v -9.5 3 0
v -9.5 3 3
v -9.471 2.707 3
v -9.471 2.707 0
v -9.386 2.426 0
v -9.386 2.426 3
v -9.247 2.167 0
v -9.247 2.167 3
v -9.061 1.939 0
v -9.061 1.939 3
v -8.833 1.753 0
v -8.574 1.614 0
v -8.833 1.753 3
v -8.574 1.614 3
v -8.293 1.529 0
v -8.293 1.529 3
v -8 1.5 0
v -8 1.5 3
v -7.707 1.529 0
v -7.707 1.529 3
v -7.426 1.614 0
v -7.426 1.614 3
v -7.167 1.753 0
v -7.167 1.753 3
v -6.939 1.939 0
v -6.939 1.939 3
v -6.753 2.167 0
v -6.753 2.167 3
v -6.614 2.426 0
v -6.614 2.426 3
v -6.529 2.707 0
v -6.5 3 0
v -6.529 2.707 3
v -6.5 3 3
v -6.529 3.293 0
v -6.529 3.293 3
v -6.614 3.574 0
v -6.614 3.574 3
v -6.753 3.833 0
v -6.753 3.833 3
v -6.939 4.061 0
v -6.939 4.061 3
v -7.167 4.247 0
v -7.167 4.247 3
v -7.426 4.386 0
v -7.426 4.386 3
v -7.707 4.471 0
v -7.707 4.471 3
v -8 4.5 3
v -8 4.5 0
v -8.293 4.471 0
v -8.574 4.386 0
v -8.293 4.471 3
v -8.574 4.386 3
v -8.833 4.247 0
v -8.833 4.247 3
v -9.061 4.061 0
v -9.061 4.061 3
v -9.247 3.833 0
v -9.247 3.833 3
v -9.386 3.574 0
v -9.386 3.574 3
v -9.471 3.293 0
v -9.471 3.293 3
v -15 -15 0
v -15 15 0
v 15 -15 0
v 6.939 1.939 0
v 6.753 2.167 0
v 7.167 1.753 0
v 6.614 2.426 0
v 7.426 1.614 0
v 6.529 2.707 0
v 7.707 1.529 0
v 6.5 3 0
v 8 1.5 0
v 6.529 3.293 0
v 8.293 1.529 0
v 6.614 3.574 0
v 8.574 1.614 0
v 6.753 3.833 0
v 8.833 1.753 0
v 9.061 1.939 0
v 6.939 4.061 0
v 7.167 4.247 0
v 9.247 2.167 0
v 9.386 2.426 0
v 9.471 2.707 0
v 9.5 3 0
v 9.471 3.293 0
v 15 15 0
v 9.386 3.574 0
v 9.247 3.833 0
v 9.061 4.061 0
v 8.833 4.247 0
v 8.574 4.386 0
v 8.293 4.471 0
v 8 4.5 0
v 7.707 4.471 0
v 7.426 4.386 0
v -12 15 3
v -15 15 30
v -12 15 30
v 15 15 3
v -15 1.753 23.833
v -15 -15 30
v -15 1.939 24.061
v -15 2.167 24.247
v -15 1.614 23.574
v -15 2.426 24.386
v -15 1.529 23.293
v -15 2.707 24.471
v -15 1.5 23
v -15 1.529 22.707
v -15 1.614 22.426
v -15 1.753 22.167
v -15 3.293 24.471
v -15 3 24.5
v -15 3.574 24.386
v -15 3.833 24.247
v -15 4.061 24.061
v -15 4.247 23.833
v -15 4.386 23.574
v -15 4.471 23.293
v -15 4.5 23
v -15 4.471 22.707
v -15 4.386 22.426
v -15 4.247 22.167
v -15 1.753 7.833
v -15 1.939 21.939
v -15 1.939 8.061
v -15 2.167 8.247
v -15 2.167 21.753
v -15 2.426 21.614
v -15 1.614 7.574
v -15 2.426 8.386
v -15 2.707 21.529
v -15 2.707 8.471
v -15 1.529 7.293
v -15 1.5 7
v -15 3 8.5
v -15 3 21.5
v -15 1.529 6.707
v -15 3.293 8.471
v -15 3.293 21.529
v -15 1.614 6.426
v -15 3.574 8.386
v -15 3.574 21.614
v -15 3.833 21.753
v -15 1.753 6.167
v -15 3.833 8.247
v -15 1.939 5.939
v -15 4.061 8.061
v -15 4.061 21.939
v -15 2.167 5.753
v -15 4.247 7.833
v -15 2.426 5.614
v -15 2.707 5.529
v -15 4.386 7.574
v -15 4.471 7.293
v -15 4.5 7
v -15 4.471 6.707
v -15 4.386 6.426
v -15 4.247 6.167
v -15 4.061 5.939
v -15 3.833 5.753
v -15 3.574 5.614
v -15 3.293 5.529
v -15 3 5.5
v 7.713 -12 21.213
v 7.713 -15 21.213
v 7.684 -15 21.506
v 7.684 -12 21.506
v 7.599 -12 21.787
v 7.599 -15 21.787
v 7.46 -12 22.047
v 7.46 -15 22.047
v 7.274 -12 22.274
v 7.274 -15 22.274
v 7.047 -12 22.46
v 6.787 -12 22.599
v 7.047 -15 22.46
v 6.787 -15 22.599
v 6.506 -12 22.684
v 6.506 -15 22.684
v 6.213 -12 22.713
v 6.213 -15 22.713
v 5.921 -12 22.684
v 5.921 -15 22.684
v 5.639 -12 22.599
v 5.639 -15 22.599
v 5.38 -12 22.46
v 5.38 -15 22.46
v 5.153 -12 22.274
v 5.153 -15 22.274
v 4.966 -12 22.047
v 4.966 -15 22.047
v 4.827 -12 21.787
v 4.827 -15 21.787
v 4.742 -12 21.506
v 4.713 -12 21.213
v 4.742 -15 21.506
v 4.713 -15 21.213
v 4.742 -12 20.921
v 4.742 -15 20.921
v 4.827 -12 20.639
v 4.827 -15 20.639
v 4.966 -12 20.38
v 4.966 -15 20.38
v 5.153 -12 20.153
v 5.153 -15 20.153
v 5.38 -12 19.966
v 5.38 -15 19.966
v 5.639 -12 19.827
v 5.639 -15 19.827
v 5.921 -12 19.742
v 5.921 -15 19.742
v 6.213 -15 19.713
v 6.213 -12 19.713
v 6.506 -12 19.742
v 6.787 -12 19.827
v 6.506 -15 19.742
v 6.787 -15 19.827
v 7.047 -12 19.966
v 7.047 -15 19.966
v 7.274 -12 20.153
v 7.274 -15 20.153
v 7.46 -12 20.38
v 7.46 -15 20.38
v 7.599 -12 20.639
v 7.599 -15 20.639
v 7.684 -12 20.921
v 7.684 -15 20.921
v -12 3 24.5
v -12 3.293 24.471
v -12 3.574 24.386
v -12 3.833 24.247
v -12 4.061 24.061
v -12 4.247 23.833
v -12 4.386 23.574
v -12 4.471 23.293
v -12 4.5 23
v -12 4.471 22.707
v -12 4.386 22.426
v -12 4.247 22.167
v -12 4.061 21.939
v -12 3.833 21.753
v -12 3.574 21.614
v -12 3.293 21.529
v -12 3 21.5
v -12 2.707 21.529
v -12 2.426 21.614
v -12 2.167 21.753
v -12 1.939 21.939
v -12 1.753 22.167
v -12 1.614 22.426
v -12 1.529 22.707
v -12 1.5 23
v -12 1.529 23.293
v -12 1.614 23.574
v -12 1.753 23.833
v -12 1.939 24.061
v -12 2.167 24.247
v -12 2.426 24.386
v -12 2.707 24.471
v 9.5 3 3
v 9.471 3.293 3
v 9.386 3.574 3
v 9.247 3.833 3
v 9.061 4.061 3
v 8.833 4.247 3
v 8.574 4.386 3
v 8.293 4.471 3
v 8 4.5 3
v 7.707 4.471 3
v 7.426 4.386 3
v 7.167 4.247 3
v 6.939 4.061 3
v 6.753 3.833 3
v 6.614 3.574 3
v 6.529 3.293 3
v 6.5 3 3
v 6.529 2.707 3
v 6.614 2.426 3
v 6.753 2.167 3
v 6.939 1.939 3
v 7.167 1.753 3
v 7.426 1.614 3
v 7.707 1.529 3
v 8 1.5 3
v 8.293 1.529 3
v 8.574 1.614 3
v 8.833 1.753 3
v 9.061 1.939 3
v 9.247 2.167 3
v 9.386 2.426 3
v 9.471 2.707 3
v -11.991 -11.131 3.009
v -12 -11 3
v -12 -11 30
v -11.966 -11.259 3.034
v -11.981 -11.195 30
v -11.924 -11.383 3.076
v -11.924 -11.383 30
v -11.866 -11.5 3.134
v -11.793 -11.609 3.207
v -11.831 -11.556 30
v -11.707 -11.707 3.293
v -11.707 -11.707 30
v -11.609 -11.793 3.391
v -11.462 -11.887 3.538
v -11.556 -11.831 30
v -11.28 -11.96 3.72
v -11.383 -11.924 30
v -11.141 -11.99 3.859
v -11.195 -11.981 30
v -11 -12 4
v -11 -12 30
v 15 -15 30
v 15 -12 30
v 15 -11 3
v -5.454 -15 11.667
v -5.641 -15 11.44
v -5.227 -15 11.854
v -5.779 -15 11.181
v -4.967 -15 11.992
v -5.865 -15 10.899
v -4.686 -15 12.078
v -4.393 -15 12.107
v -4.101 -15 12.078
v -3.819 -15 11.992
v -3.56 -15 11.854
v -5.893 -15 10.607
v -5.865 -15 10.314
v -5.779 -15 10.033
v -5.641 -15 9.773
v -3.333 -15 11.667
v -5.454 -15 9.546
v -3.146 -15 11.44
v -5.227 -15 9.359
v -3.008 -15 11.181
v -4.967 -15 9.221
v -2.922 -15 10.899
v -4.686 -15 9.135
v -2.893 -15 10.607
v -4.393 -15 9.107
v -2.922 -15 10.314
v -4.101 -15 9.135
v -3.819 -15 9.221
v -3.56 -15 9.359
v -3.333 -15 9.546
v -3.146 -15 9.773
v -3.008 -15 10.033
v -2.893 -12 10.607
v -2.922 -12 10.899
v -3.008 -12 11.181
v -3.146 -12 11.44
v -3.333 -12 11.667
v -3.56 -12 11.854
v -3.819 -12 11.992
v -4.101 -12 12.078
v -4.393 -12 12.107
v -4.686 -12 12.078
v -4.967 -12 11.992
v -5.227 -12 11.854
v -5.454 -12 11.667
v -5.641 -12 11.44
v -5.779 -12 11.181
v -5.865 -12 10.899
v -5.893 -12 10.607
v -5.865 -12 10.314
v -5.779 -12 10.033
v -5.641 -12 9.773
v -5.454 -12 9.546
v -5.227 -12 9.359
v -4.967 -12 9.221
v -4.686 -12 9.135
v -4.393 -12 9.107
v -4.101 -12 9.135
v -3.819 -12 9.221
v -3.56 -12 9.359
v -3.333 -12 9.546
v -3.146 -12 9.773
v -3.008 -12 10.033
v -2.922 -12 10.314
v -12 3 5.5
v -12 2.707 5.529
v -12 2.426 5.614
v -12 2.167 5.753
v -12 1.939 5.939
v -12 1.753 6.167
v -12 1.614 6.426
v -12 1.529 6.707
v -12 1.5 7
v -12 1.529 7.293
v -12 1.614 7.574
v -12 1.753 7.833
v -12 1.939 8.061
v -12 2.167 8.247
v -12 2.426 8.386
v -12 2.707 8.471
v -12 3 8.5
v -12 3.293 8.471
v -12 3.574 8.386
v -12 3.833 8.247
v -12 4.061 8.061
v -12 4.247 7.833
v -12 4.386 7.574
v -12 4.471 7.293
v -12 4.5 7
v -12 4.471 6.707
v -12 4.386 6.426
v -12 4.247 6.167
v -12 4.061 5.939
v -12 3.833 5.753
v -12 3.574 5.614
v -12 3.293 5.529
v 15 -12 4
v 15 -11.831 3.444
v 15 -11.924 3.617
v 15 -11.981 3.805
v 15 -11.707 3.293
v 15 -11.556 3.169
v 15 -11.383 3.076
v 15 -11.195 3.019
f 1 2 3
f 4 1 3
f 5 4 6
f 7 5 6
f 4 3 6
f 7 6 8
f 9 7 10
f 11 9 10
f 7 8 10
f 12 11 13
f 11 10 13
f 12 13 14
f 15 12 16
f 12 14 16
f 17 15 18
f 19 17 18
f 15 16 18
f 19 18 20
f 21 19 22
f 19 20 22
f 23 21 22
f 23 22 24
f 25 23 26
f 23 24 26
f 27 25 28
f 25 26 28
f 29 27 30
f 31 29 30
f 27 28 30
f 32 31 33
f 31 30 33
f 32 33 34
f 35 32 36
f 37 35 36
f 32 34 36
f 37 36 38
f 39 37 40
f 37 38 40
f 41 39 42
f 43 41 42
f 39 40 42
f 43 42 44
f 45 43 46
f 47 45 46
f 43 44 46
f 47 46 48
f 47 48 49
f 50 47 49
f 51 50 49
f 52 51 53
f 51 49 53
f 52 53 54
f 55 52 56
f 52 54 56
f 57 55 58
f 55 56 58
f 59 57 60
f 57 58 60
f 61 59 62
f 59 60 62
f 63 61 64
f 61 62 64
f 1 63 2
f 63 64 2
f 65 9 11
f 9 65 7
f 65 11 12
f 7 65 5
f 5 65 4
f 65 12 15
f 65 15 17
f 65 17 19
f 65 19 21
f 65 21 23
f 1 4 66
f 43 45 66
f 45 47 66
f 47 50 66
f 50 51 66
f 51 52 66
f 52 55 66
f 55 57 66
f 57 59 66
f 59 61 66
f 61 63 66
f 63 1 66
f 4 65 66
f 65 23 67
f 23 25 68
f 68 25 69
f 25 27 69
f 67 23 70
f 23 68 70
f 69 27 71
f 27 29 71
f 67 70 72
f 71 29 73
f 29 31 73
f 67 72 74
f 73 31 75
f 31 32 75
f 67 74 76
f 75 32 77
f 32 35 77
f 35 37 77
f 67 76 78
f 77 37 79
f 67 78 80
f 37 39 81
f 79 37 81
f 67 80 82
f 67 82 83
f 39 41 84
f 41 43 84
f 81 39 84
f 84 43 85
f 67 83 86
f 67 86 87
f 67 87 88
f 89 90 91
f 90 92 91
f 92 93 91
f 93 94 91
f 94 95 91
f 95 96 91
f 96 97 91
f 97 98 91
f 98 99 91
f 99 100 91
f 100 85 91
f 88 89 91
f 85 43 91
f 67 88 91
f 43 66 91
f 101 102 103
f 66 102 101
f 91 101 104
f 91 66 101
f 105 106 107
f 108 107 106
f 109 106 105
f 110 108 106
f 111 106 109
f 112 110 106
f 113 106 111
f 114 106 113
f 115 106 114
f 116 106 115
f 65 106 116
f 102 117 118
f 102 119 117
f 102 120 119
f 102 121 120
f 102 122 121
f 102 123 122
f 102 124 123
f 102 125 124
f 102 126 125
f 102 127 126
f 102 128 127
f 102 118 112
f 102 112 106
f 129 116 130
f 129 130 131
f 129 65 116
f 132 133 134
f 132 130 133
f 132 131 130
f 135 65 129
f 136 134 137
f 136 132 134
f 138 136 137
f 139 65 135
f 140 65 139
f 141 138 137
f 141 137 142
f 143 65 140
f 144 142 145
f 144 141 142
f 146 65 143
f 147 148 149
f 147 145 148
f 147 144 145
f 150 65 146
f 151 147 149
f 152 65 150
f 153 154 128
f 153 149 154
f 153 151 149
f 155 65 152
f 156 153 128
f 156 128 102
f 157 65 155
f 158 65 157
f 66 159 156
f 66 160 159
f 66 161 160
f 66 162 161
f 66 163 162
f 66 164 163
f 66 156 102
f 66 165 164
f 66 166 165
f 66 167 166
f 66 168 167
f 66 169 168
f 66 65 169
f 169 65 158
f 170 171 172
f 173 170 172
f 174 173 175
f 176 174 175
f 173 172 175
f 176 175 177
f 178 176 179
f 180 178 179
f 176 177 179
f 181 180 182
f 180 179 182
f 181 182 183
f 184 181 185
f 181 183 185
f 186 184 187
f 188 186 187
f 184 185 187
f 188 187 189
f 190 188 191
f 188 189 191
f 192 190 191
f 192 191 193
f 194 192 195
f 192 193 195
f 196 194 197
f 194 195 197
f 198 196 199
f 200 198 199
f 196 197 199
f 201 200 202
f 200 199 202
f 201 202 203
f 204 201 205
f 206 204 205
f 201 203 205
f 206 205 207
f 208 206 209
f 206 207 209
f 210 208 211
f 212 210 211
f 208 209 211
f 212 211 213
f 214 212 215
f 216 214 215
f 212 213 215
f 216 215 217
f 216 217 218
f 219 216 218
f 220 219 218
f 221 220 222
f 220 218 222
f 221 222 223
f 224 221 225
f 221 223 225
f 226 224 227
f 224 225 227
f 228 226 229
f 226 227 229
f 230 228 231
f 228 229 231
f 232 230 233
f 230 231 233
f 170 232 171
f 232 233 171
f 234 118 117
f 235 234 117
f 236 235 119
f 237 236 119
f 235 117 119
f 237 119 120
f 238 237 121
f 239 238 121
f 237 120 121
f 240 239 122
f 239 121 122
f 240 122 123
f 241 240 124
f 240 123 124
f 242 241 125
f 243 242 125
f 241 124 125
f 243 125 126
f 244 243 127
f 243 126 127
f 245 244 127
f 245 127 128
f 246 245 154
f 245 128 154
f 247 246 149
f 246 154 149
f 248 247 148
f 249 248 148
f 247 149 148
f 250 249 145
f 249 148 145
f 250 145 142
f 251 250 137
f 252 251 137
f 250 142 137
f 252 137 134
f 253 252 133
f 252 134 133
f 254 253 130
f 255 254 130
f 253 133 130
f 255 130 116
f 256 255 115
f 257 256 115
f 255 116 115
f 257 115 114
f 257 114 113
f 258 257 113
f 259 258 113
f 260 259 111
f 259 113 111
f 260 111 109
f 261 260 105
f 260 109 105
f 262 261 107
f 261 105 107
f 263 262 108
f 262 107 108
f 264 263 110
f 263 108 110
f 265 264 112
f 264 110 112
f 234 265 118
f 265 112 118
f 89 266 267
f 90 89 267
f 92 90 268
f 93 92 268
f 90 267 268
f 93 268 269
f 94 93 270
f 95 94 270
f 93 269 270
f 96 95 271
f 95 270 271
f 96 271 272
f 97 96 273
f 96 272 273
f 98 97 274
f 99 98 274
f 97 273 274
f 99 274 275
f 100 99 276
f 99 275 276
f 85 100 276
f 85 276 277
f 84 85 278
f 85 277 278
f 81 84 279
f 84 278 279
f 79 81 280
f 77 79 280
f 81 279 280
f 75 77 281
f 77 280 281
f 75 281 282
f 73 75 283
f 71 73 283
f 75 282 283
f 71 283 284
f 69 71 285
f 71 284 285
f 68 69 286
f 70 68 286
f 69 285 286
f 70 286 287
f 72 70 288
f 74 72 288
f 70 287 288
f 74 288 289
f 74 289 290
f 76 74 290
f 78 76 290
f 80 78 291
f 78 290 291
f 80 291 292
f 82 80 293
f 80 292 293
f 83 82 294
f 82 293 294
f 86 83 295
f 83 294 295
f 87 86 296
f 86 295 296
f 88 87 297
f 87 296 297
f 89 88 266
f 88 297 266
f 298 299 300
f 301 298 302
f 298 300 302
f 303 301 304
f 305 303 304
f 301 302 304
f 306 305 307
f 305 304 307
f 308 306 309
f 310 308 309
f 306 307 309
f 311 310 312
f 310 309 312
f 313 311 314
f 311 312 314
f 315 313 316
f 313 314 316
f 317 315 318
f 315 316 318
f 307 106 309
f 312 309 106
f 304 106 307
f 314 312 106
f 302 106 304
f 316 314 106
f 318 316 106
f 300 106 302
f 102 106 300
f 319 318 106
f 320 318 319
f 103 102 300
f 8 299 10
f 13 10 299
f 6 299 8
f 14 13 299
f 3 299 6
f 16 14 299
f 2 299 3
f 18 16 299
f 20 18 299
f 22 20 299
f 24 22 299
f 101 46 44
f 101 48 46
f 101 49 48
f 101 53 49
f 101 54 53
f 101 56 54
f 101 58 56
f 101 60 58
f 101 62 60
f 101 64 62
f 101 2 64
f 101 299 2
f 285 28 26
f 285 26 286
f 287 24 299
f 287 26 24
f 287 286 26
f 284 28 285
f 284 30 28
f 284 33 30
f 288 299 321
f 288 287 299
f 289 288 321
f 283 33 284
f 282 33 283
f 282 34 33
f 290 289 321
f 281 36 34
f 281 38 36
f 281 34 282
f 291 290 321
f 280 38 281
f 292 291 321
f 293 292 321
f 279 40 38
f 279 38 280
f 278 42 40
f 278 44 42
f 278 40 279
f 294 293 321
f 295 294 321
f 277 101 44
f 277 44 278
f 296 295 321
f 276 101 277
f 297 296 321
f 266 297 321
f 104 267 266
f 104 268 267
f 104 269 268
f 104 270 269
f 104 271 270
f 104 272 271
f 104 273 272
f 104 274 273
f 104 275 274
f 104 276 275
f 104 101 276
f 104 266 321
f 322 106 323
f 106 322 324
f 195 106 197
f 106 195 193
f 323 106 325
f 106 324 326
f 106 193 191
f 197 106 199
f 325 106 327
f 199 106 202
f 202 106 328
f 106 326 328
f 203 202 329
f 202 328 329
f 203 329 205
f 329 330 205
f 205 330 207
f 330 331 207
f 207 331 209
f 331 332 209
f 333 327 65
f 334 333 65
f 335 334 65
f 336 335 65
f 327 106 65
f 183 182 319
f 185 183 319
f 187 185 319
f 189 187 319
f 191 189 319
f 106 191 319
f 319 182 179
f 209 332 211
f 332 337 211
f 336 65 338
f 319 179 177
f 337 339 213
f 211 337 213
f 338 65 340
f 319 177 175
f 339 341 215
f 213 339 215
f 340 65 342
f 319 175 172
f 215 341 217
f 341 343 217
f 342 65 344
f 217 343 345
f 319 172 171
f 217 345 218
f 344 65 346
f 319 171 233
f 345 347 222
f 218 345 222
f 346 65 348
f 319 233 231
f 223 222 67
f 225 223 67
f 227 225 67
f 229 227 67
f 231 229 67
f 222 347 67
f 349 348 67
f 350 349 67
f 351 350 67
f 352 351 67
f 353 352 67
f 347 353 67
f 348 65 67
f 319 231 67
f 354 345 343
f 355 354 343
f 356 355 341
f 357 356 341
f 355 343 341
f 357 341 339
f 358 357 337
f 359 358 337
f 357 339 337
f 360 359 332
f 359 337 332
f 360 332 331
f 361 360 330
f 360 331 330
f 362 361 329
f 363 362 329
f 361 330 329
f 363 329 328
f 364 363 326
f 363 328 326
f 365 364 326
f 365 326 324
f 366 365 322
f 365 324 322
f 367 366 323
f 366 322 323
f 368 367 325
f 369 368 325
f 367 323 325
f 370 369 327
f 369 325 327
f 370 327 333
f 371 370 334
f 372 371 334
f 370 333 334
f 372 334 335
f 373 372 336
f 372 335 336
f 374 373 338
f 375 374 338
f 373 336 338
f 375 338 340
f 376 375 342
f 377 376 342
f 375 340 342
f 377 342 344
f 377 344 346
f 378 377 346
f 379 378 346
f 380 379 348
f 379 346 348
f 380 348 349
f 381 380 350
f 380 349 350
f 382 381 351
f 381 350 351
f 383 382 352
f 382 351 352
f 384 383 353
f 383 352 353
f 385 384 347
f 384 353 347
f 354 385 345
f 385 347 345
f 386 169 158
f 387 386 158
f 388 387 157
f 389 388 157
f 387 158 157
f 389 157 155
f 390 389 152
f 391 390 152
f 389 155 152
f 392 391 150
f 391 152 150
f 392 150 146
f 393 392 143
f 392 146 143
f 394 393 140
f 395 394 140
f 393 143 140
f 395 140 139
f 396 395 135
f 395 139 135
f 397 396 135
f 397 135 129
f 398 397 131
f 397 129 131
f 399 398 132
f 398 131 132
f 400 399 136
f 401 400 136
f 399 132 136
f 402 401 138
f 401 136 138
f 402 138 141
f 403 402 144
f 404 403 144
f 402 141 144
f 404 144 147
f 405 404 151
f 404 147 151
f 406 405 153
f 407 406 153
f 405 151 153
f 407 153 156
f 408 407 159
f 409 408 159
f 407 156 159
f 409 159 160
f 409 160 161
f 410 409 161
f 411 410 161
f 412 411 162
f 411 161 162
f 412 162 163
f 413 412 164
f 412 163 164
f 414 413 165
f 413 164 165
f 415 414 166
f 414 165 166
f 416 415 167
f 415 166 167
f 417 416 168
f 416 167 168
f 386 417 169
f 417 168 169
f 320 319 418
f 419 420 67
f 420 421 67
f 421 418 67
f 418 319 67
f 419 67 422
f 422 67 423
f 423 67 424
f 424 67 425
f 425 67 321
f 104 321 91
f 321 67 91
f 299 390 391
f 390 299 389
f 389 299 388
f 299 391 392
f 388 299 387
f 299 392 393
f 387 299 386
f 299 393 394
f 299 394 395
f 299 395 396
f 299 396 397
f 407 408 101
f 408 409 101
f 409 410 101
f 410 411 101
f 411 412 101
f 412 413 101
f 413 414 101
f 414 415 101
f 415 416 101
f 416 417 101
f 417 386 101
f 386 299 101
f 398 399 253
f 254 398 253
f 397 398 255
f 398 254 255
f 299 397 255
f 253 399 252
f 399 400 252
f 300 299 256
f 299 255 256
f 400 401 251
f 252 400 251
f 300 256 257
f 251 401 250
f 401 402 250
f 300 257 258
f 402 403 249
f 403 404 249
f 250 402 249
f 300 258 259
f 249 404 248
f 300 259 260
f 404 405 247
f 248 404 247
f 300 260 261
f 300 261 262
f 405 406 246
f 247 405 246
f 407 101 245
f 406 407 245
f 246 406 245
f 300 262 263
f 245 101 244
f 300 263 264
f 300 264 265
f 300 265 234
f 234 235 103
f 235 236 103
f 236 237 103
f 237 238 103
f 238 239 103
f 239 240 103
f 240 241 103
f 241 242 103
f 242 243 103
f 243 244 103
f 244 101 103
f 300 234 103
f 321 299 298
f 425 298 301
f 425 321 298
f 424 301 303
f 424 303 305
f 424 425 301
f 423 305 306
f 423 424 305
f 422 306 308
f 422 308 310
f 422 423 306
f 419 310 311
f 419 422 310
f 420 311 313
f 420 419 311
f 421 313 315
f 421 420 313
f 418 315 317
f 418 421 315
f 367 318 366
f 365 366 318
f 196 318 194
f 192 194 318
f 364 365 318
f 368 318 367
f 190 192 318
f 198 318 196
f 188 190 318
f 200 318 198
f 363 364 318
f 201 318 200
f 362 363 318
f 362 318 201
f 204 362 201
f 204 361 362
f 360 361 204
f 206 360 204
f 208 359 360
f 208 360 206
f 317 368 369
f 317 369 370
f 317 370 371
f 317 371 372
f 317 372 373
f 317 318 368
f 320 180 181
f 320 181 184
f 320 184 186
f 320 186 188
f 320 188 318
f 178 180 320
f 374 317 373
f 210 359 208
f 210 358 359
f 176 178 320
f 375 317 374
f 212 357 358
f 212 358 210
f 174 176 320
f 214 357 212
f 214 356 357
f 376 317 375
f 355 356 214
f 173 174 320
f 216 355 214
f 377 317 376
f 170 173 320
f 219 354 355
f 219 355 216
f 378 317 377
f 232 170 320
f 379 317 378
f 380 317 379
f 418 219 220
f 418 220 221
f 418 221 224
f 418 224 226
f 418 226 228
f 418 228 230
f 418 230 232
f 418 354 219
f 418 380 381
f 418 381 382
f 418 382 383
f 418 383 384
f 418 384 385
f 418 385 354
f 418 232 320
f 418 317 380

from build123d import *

# Parameters (mm, degrees)
SKETCH_1_W          = 30
SKETCH_1_H          = 30
EXTRUDE_1_DEPTH     = 3
SKETCH_2_R          = 1.5
CUT_EXTRUDE_1_DEPTH = 3
SKETCH_3_W          = 30
SKETCH_3_H          = 3
EXTRUDE_2_DEPTH     = 27
SKETCH_5_W          = 30
SKETCH_5_H          = 30
EXTRUDE_3_DEPTH     = 3
FILLET_1_R          = 1
SKETCH_10_R         = 1.5
CUT_EXTRUDE_4_DEPTH = 3
SKETCH_11_R         = 1.5
CUT_EXTRUDE_5_DEPTH = 3


with BuildPart() as part:
    # 草图1 → 凸台-拉伸1 (new body)
    with BuildSketch(Plane.XY):
        Rectangle(SKETCH_1_W, SKETCH_1_H)
    extrude(amount=EXTRUDE_1_DEPTH)

    # 草图2 → 切除-拉伸1 (cut)
    with BuildSketch(Plane.XY.offset(3)):
        with Locations((8, 3)):
            Circle(SKETCH_2_R)
        with Locations(Location((-8, 3, 0), (0, 0, 180))):
            Circle(SKETCH_2_R)
    extrude(amount=-CUT_EXTRUDE_1_DEPTH, mode=Mode.SUBTRACT)

    # 草图3 → 凸台-拉伸2 (add)
    with BuildSketch(Plane.XY.offset(3)):
        with Locations((0, -13.5)):
            Rectangle(SKETCH_3_W, SKETCH_3_H)
    extrude(amount=EXTRUDE_2_DEPTH)

    # 草图5 → 凸台-拉伸3 (add)
    with BuildSketch(Plane.ZY.offset(15)):
        with Locations((15, 0)):
            Rectangle(SKETCH_5_W, SKETCH_5_H)
    extrude(amount=-EXTRUDE_3_DEPTH)

    # 圆角1
    fillet_1_edges = [part.edges().sort_by_distance(p)[0] for p in [
        (1.5, -12, 3),
        (-12, -12, 16.5),
    ]]
    fillet(fillet_1_edges, radius=FILLET_1_R)

    # 草图10 → 切除-拉伸4 (cut)
    with BuildSketch(Plane.XZ.offset(15)):
        with Locations((-4.393398282, 10.606601718)):
            Circle(SKETCH_10_R)
        with Locations((6.213203436, 21.213203436)):
            Circle(SKETCH_10_R)
    extrude(amount=-CUT_EXTRUDE_4_DEPTH, mode=Mode.SUBTRACT)

    # 草图11 → 切除-拉伸5 (cut)
    with BuildSketch(Plane.ZY.offset(15)):
        with Locations((23, 3)):
            Circle(SKETCH_11_R)
        with Locations(Location((7, 3, 0), (0, 0, 180))):
            Circle(SKETCH_11_R)
    extrude(amount=-CUT_EXTRUDE_5_DEPTH, mode=Mode.SUBTRACT)


solid = part.part
